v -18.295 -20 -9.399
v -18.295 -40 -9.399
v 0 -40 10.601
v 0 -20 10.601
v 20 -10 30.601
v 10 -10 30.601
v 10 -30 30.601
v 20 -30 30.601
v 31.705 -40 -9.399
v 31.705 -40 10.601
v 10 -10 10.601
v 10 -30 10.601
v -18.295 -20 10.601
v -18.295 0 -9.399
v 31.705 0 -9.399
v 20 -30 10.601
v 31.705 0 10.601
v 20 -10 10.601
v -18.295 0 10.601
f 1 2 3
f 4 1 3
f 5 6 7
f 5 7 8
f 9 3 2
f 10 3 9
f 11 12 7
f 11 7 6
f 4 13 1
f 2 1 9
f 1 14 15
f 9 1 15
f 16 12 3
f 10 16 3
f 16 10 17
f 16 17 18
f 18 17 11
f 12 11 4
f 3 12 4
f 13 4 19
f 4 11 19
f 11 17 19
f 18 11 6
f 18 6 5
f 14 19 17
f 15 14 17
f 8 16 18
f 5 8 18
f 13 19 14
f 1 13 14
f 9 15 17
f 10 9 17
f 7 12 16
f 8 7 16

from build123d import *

# Parameters (mm, degrees)
F1_DEPTH = 40
F3_DEPTH = 20
F4_W     = 10
F4_H     = 20
F5_DEPTH = 20


with BuildPart() as f1:
    # F0 (on Front) → F1 (new body)
    with BuildSketch(Plane.XZ):
        Polygon((31.704547, 10.600731), (1.704547, 10.600731), (-18.295453, 10.600731), (-18.295453, -9.399269), (31.704547, -9.399269), align=None)
    extrude(amount=F1_DEPTH)

    # F2 (on face) → F3 (cut)
    with BuildSketch(Plane.XZ.offset(40)):
        Polygon((-18.295453, 10.600731), (-18.295453, -9.399269), (0, 10.600731), align=None)
    extrude(amount=-F3_DEPTH, mode=Mode.SUBTRACT)

    # F4 (on face) → F5 (join)
    with BuildSketch(Plane.XY.offset(10.600731)):
        with Locations((15, -20)):
            Rectangle(F4_W, F4_H)
    extrude(amount=F5_DEPTH)


solid = f1.part
